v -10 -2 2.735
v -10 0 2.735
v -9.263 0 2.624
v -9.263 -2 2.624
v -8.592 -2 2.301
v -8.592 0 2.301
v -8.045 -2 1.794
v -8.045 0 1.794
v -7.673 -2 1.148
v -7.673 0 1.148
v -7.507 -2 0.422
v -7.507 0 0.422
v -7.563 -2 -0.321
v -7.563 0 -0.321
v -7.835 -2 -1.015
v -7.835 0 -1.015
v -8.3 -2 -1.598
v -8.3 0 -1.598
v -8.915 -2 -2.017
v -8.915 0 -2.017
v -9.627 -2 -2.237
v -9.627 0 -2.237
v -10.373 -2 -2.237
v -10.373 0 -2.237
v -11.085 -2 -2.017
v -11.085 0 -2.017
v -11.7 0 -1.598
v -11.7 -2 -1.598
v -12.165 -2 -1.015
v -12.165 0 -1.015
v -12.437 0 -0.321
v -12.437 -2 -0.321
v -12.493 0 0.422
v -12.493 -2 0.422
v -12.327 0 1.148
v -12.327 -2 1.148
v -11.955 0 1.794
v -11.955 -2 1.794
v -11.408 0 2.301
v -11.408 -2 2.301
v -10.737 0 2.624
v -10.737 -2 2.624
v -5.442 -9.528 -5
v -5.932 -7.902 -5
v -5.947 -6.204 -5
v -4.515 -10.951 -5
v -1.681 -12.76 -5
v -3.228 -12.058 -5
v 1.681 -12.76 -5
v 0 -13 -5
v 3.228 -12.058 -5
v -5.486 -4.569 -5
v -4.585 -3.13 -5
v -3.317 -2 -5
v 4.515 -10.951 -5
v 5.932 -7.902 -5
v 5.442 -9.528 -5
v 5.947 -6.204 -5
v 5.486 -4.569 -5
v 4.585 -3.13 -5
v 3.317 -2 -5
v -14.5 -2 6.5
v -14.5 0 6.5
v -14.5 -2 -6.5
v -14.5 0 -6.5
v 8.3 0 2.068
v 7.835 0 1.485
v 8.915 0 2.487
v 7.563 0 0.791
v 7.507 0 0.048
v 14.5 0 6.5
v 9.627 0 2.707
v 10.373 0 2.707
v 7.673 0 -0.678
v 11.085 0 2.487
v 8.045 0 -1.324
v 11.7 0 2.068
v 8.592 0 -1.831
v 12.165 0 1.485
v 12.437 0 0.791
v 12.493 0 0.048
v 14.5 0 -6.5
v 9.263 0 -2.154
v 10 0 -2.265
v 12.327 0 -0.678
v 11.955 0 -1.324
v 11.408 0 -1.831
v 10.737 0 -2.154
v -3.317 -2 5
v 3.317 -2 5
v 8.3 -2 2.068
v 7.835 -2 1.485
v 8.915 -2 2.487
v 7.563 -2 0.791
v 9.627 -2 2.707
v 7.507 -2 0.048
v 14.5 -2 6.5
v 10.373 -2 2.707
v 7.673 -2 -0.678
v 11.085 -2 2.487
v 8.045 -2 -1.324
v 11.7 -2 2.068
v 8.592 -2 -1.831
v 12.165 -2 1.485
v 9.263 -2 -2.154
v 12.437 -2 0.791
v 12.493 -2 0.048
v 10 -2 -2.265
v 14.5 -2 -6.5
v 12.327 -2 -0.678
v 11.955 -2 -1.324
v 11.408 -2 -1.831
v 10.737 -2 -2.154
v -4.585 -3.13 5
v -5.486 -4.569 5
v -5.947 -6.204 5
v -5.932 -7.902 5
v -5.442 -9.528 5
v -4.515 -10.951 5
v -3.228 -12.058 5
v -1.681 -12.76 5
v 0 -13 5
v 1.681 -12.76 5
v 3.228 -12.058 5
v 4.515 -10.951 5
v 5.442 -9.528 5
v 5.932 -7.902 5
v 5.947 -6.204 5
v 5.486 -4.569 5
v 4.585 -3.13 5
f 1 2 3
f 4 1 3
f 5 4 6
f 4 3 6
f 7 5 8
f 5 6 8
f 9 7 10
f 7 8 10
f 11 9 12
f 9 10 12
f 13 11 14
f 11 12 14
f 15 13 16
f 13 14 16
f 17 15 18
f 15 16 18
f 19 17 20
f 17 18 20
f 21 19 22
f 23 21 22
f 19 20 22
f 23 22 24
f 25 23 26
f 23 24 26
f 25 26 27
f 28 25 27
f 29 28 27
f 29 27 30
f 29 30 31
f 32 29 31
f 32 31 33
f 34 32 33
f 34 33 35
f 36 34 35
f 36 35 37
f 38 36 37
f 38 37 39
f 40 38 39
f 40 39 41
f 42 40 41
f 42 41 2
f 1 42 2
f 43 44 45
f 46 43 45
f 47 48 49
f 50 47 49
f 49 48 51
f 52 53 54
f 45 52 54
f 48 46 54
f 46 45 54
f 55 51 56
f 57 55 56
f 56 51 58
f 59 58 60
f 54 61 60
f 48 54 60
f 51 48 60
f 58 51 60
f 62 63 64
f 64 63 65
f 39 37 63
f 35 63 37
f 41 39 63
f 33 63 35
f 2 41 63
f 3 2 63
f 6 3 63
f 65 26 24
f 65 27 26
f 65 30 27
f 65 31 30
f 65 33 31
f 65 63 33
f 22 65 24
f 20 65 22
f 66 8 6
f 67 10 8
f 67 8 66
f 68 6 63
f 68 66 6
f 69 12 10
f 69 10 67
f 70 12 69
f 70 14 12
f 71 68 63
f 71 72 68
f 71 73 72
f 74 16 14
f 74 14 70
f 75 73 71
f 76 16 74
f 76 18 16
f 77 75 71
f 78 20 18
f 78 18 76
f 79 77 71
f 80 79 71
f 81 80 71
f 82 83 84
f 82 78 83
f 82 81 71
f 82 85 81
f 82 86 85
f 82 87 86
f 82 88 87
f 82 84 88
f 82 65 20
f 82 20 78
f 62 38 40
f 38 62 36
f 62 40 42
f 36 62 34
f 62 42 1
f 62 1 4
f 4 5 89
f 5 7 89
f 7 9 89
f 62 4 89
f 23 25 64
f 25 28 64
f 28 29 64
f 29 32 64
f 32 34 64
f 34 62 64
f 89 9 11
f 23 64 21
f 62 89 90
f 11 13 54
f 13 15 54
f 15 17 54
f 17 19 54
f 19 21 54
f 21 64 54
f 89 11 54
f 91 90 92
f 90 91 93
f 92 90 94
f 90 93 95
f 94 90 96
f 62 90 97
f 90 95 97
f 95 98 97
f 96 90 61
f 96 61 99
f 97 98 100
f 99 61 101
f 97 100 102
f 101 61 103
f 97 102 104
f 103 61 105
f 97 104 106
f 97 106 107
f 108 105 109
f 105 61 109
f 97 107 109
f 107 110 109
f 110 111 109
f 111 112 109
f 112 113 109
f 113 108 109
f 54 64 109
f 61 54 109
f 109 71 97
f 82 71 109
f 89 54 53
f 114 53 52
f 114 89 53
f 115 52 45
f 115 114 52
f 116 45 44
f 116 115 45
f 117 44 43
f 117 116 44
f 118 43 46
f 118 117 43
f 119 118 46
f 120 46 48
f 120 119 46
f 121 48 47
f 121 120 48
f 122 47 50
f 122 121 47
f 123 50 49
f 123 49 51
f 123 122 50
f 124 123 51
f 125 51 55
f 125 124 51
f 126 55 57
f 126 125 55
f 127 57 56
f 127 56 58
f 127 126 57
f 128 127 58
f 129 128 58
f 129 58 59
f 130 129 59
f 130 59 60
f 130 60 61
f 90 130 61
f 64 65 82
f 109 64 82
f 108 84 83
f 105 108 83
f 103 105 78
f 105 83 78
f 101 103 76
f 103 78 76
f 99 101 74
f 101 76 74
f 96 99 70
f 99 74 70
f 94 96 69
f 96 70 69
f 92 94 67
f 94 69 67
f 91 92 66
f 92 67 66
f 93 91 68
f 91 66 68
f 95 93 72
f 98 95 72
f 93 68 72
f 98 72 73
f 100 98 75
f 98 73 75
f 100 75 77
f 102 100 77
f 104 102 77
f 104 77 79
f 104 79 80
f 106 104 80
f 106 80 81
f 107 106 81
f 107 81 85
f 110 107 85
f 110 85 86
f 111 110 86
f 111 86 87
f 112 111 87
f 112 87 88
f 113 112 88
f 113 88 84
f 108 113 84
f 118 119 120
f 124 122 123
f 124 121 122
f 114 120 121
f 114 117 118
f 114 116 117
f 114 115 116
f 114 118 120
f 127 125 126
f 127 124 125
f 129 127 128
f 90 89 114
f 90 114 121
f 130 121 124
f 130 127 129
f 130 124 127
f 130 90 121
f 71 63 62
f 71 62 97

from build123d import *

# Parameters (mm, degrees)
SKETCH_1_W          = 29
SKETCH_1_H          = 13
EXTRUDE_1_DEPTH     = 2
SKETCH_2_R          = 2.5
CUT_EXTRUDE_1_DEPTH = 17.015617378
SKETCH_3_R          = 6
EXTRUDE_2_DEPTH     = 5


with BuildPart() as part:
    # 草图1 → 凸台-拉伸1 (new body)
    with BuildSketch(Plane(origin=(0, 0, 0), x_dir=(1, 0, 0), z_dir=(0, 1, 0))):
        Rectangle(SKETCH_1_W, SKETCH_1_H)
    extrude(amount=-EXTRUDE_1_DEPTH)

    # 草图2 → 切除-拉伸1 (cut, through all)
    with BuildSketch(Plane(origin=(0, 0, 0), x_dir=(1, 0, 0), z_dir=(0, 1, 0))):
        with Locations((-10, -0.234995389)):
            Circle(SKETCH_2_R)
        with Locations((10, -0.234995389)):
            Circle(SKETCH_2_R)
    extrude(amount=-CUT_EXTRUDE_1_DEPTH, mode=Mode.SUBTRACT)

    # 草图3 → 凸台-拉伸2 (add, symmetric)
    with BuildSketch(Plane.XY):
        with Locations((0, -7)):
            Circle(SKETCH_3_R)
    extrude(amount=EXTRUDE_2_DEPTH, both=True)


solid = part.part
